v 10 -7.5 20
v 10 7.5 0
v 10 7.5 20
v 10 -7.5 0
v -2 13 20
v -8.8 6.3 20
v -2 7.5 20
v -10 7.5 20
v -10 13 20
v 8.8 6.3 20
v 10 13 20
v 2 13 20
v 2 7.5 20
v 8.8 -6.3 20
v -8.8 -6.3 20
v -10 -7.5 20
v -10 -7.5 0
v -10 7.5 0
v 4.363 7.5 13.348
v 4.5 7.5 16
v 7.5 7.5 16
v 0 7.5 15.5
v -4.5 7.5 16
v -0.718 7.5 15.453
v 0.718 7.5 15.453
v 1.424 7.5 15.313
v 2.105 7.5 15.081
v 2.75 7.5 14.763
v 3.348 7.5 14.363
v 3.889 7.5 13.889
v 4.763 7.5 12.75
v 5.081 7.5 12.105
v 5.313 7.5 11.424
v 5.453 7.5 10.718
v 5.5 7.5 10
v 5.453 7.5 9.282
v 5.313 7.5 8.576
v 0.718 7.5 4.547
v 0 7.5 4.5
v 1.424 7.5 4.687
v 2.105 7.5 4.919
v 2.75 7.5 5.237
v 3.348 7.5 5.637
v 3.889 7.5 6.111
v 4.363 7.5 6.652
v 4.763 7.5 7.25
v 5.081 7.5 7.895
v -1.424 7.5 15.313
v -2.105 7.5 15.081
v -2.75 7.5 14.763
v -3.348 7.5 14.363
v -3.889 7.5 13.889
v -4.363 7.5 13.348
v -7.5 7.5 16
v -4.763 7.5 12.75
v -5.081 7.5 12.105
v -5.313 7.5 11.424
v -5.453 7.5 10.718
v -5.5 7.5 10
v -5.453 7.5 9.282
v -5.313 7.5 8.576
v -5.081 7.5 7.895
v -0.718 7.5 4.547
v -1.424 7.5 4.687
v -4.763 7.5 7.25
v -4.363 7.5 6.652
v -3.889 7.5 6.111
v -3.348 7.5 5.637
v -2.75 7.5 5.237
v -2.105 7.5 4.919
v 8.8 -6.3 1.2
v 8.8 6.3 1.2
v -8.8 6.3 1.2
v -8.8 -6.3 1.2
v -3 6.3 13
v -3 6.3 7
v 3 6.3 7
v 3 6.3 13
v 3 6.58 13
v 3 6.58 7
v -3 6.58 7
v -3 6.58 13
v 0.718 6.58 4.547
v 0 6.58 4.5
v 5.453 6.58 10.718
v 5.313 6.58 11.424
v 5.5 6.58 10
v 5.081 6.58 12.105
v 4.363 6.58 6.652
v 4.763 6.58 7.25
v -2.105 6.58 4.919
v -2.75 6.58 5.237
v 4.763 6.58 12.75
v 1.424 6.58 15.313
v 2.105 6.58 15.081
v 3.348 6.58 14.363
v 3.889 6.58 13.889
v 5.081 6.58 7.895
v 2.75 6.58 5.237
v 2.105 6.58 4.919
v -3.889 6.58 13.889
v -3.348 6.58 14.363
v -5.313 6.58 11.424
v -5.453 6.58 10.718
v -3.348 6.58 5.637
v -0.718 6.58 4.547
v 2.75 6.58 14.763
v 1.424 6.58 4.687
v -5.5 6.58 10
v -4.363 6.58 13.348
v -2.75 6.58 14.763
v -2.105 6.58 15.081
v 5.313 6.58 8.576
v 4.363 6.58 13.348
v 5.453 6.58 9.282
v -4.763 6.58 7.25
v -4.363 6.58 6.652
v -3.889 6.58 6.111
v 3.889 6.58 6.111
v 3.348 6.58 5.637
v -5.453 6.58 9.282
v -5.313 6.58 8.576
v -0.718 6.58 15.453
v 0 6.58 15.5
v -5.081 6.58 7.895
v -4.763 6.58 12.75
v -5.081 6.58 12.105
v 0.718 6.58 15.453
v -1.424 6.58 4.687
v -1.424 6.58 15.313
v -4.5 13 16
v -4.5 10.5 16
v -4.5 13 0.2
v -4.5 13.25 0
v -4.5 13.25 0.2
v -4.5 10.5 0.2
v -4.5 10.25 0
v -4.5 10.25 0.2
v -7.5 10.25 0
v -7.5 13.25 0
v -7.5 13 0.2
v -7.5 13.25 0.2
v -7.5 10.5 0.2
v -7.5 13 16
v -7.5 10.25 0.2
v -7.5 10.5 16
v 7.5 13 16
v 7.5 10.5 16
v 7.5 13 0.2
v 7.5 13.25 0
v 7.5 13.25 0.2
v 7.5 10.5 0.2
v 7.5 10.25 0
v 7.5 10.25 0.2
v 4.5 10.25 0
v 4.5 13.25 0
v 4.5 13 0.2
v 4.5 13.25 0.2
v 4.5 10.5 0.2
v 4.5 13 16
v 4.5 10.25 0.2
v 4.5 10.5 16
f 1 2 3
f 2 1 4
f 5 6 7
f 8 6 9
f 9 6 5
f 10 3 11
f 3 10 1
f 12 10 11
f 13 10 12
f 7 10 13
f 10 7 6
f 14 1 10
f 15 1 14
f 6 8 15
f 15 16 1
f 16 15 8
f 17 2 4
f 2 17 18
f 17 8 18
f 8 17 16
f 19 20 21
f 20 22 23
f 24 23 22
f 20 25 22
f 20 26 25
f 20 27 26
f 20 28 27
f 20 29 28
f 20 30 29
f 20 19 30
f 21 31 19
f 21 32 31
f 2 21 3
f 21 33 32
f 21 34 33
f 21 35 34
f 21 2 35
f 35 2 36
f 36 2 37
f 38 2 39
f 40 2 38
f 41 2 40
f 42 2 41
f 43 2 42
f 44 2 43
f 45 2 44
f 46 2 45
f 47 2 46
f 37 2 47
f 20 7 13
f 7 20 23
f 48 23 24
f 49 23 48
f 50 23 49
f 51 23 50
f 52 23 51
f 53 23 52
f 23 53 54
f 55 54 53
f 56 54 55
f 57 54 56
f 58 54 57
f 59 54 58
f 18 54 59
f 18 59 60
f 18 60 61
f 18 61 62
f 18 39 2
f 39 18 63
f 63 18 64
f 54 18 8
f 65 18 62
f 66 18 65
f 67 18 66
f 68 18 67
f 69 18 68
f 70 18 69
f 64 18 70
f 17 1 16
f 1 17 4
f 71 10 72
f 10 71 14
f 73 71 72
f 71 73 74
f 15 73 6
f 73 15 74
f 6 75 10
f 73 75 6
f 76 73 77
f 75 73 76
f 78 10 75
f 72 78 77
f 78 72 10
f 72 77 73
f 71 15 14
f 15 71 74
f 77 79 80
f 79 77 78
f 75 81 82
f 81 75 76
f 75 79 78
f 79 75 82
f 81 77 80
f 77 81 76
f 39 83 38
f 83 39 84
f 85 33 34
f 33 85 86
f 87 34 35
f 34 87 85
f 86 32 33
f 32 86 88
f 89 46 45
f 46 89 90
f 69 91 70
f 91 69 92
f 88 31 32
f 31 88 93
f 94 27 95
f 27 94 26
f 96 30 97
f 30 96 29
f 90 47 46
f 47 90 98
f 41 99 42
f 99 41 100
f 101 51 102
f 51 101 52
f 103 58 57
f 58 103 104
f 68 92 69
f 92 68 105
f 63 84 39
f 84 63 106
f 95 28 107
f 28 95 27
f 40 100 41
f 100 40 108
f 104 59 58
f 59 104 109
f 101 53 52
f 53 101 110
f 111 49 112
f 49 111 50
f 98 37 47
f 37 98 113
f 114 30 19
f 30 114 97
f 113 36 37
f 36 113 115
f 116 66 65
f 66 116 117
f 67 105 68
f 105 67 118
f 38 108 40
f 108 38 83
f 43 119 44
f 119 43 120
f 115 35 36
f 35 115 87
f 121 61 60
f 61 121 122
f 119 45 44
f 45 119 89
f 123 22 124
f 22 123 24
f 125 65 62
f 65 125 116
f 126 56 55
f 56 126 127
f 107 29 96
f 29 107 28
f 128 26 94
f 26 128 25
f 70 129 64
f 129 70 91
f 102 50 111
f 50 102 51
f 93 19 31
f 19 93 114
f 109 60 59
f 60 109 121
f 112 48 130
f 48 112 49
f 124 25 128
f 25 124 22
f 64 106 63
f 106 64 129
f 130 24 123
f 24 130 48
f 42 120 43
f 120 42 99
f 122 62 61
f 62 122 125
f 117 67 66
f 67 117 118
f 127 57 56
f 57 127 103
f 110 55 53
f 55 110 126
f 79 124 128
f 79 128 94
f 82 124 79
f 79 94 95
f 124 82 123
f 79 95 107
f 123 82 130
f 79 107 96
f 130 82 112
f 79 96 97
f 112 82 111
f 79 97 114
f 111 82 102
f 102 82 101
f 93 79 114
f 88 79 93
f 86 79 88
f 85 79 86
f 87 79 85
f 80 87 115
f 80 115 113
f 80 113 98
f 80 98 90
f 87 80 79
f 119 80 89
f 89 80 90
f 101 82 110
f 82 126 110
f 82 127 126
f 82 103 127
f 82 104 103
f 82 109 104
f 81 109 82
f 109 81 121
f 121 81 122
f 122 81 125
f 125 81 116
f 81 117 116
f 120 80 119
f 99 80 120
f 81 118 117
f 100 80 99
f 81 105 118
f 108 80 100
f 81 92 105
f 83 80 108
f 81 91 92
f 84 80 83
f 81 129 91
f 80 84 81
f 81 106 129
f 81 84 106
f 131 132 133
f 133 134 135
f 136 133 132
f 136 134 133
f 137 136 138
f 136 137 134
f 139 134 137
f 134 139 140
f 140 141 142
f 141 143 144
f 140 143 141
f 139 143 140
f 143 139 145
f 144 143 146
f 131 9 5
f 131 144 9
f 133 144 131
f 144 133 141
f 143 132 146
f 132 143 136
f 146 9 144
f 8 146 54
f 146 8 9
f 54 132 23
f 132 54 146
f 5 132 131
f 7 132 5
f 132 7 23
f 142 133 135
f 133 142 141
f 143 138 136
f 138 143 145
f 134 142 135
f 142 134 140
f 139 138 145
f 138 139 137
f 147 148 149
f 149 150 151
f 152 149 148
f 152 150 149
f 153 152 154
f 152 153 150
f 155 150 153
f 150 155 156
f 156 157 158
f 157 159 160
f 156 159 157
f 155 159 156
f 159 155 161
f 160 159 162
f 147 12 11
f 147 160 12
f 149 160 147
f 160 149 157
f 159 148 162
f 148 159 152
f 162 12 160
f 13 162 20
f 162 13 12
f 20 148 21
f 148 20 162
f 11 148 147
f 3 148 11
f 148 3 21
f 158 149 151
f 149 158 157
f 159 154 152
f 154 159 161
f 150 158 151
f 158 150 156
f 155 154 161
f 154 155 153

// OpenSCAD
/* Konstanten für Kastenformat */
OPEN_NONE = 0; // Box mit fünf Seiten
OPEN_LEFT = -1; // Box mit vier Seite, vorne und links offen
OPEN_RIGHT = 1; // Box mit vier Seite, vorne und rechts offen

/*
 * LED-Öffnungstyp (Parameter "led"). Bestimmt die komplette Öffnungsgeometrie.
 * Zweiteilige Öffnungen sitzen auf der Rückwand und sind durchgehend: das innere
 * Feature (LED-/Lichtseite) ist led_membrane (0.4mm) tief, das äußere Feature
 * nimmt die restliche Wanddicke ein.
 */
LED_NONE   = 0; // keine Öffnung
LED_3MM    = 1; // durchgehender Zylinder 3mm
LED_5MM    = 2; // durchgehender Zylinder 5mm
LED_5050   = 3; // innen Zylinder 4mm, außen Ausschnitt 6x6mm (WS2812)
LED_3528   = 4; // innen Zylinder 3mm, außen Ausschnitt 4x3mm
LED_WS2812 = 5; // innen Ausschnitt 6x6mm, außen Zylinder 15mm
LED_DEFAULT = LED_5050;

/*
 * Halteclip auf der Deckenwand (Parameter "clip"), unabhängig vom Öffnungstyp.
 */
CLIP_NONE   = 0; // kein Clip
CLIP_SINGLE = 1; // ein Clip mittig über der Öffnung
CLIP_DOUBLE = 2; // zwei Clips, 14mm Abstand (je 7mm links/rechts der Mitte)
clip_dist   = 12; // Abstand der beiden Clips bei CLIP_DOUBLE

/*
 * Fläche, auf der LED-Öffnung + Clip sitzen (Parameter "face").
 * Die LED-Position wird als [u, v] relativ zur Flächenmitte (mm) angegeben:
 *   FACE_TOP:   u entlang Breite (X), v entlang Tiefe (Z)
 *   FACE_LEFT/RIGHT: u entlang Tiefe (Z), v entlang Höhe (Y)
 * u ist zugleich die Achse, entlang der die Doppelclips versetzt werden.
 */
FACE_TOP   = 0; // oben:   X-Z-Fläche bei y = +height/2 (größere Y-Koordinate)
FACE_LEFT  = 1; // links:  Y-Z-Fläche bei x = -width/2
FACE_RIGHT = 2; // rechts: Y-Z-Fläche bei x = +width/2

/* Wandstärke */
wall = 1.2;
tunnel_height = 2;
clip_spacing = 3;
clip_thick = 2.5;
/* verbleibende Materialdicke auf der Innenseite bei quadratischem Ausschnitt */
led_membrane = 0.4;
/*
 * width/height = Abmessungen des "Fensters" (Außenmass)
 * depth = Tiefe der Kiste
 * open = Kiste mit zwei offenen Seiten für Über-Eck Einbau
 * led = Öffnungstyp (LED_*), siehe Konstanten oben
 * led_offset = Abweichung der LED Position von der Mitte
 *    Zahl > 1: Offset in Einheiten von der Mitte aus
 *    Zahl < 1: relative Position auf der Wand von links außen gemessen
*/
/*
 * Einzelnes Feature einer Öffnung, zentriert um z = 0, Höhe h.
 *   shape als Vektor [x,y]  -> quadratischer Ausschnitt
 *   shape als Zahl d        -> Zylinder mit Durchmesser d
 */
module led_feature( shape, h ) {
    if (is_list(shape))
        cube([shape[0], shape[1], h], true);
    else
        cylinder(d = shape, h = h, center = true, $fn = 48);
}

/*
 * Negativform der LED-Öffnung in kanonischer Lage:
 *   Wandmitte liegt bei z = 0, die Wand reicht von -wall/2 (außen) bis
 *   +wall/2 (innen); +z zeigt ins Innere der Box.
 *   through  = durchgehender Zylinder (Durchmesser) über die ganze Wand
 *   inner    = Feature auf der Innenseite, led_membrane (0.4mm) tief
 *   outer    = Feature auf der Außenseite, restliche Wanddicke
 *   inner und outer überlappen in der Wand -> durchgehende Öffnung.
 */
module led_negative( inner = undef, outer = undef, through = undef ) {
    eps = 0.1 * wall; // Überstand gegen Rendering-Fehler an den Flächen
    if (!is_undef(through))
        cylinder(d = through, h = wall + 2*eps, center = true, $fn = 48);
    if (!is_undef(inner))
        translate([0, 0, (wall - led_membrane + eps)/2])
            led_feature(inner, led_membrane + eps);
    if (!is_undef(outer))
        translate([0, 0, -led_membrane/2])
            led_feature(outer, wall - led_membrane + 2*eps);
}

/*
 * Negativform der LED-Öffnung nach Öffnungstyp (kanonische Lage, +z = innen).
 */
module led_negative_by_type( led ) {
    if (led == LED_3MM)         led_negative(through = 3);
    else if (led == LED_5MM)    led_negative(through = 5);
    else if (led == LED_5050)   led_negative(inner = 4,      outer = [6,6]);
    else if (led == LED_3528)   led_negative(inner = 3,      outer = [4,3]);
    else if (led == LED_WS2812) led_negative(inner = [6,6],  outer = 11);
}

/*
 * Setzt die Kinder in kanonischer Lage auf die gewählte Fläche der Box:
 *   - Wandmitte der Fläche liegt im Ursprung der Kinder
 *   - kanonisches +z zeigt ins Box-Innere
 * pos = [u, v] verschiebt entlang der Flächenachsen (siehe FACE_* oben).
 */
module on_face( face, pos, width, height, depth ) {
    if (face == FACE_TOP)
        translate([pos[0], height/2 - wall/2, pos[1]]) rotate([90,0,0]) children();
    else if (face == FACE_RIGHT)
        translate([width/2 - wall/2, pos[1], pos[0]]) rotate([0,-90,0]) children();
    else if (face == FACE_LEFT)
        translate([-width/2 + wall/2, pos[1], pos[0]]) rotate([0,90,0]) children();
}

/*
 * Halteclip, IMMER entlang Z (Tiefe) ausgerichtet, unabhängig von der Fläche.
 * Lokaler Aufbau: Außenfläche der Wand bei y = 0, Clip ragt nach +y (außen),
 * Balken läuft über die ganze Tiefe in Z.
 *   - Verbindung zum Gehäuse an der oberen Kante (z = +depth/2).
 *   - 3x3mm Pod am unteren Ende (z = -depth/2, Druckbett) als Haftungshilfe.
 */
module clip_z( depth ) {
    bar_y  = clip_spacing + clip_thick/2; // Mitte des Haltebalkens (außen)
    pod_h  = 0.2;                          // Höhe des Druck-Pods
    color([1,0,0]) {
        // Haltebalken parallel zur Wand, über die ganze Tiefe
        translate([0, bar_y, 0]) cube([3, clip_thick, depth], true);
        // Verbindung zum Gehäuse an der oberen Kante (z = +depth/2)
        translate([0, 0, depth/2])
            rotate([-90, 0, 0])
                linear_extrude(height = clip_spacing+clip_thick)
                    polygon([[4, 0], [-4,0], [-1.5, 4], [1.5, 4]]);
        // Pod auf dem Druckbett (z = -depth/2), 3x3mm, verbessert die Haftung
        translate([0, bar_y, -depth/2 + pod_h/2])
            cube([3, 3, pod_h], true);
    }
}

/*
 * Setzt einen Clip auf die Außenseite der gewählten Fläche.
 *   perp = Versatz entlang der flächeninternen Achse senkrecht zu Z
 *          (X bei FACE_TOP, Y bei FACE_LEFT/RIGHT).
 * Der Balken läuft stets entlang Z, der Fuß bleibt in der Rückseiten-Ebene.
 */
module clip_on( face, perp, width, height, depth ) {
    if (face == FACE_TOP)
        translate([perp, height/2, 0]) clip_z(depth);
    else if (face == FACE_RIGHT)
        translate([width/2, perp, 0]) rotate([0,0,-90]) clip_z(depth);
    else if (face == FACE_LEFT)
        translate([-width/2, perp, 0]) rotate([0,0,90]) clip_z(depth);
}

/*
 * Fasst LED-Öffnung (subtraktiv) und Halteclip(s) (additiv) zusammen und setzt
 * beide auf dieselbe Fläche an dieselbe Position. children(0) ist der Box-Körper.
 *   pos  = [u, v] LED-Mitte relativ zur Flächenmitte (mm)
 *   face = FACE_TOP | FACE_LEFT | FACE_RIGHT
 */
module led_mount( led, clip, pos, face, width, height, depth ) {
    // Clip-Versatz entlang der Achse senkrecht zu Z (= Achse, auf der die LED
    // sitzt): X bei FACE_TOP (pos[0]), Y bei FACE_LEFT/RIGHT (pos[1]).
    clip_perp = (face == FACE_TOP) ? pos[0] : pos[1];
    union() {
        difference() {
            children(0);
            on_face(face, pos, width, height, depth) led_negative_by_type(led);
        }
        if (clip == CLIP_SINGLE)
            clip_on(face, clip_perp, width, height, depth);
        else if (clip == CLIP_DOUBLE)
            for (s = [-1, 1])
                clip_on(face, clip_perp + s*clip_dist/2, width, height, depth);
    }
}

/*
 * Box-Körper: Außenquader mit ausgehöhltem Innenraum (vorne offen). Bei
 * open != OPEN_NONE wird zusätzlich eine Seitenwand entfernt (Über-Eck Einbau).
 */
module lightbox_body( width, height, depth, open = OPEN_NONE ) {
    shrink = (open != OPEN_NONE ? wall : (2*wall));
    move = open * wall;
    difference(){
        cube([width,height,depth],true);
        translate([move,0,wall]) cube([width-shrink,height-2*wall,depth],true);
    }
}

/*
 * Box-Körper mit beliebig vielen LED-Öffnungen + Clips. leds ist eine Liste von
 * Einträgen [face, led, u, v, clip]:
 *   face = FACE_TOP | FACE_LEFT | FACE_RIGHT
 *   led  = LED_* Öffnungstyp
 *   u, v = LED-Mitte relativ zur Flächenmitte (mm), siehe on_face / FACE_*
 *   clip = CLIP_NONE | CLIP_SINGLE | CLIP_DOUBLE
 */
module lightbox_multi( width, height, depth, open = OPEN_NONE, leds = [] ) {
    translate([0,0,depth/2])
    union() {
        difference() {
            lightbox_body(width, height, depth, open);
            for (m = leds)
                on_face(m[0], [m[2], m[3]], width, height, depth)
                    led_negative_by_type(m[1]);
        }
        for (m = leds) {
            face = m[0];
            clip = m[4];
            // Clip-Versatz entlang der Achse senkrecht zu Z (= LED-Achse):
            // X bei FACE_TOP (u), Y bei FACE_LEFT/RIGHT (v).
            clip_perp = (face == FACE_TOP) ? m[2] : m[3];
            if (clip == CLIP_SINGLE)
                clip_on(face, clip_perp, width, height, depth);
            else if (clip == CLIP_DOUBLE)
                for (s = [-1, 1])
                    clip_on(face, clip_perp + s*clip_dist/2, width, height, depth);
        }
    }
}

module lightbox( width = 20, height = 25, depth = 15, open = OPEN_NONE, led = LED_DEFAULT, led_pos = [0,0], clip = CLIP_NONE, face = FACE_TOP ) {
    lightbox_multi(width, height, depth, open, [[face, led, led_pos[0], led_pos[1], clip]]);
}


module clibox() {
    width = 20;
    height = 15;
    depth = 20;
    open = OPEN_NONE;
    led = LED_WS2812;
    led_pos = [0,0];
    clip = CLIP_DOUBLE;
    face = FACE_TOP;

    lightbox( width = width, height = height, depth = depth, open = open, led = led, led_pos = led_pos, clip = clip, face = face );
}

// Wird box_data.scad vor dieser Datei eingebunden (include), so liefert es
// box_dims/box_leds und der Generator rendert daraus. Ohne diese Daten dient
// die Datei als Standalone-Testfall (clibox).
if (is_undef(box_leds))
    clibox();
else
    lightbox_multi(box_dims[0], box_dims[1], box_dims[2],
                   is_undef(box_open) ? OPEN_NONE : box_open, box_leds);
